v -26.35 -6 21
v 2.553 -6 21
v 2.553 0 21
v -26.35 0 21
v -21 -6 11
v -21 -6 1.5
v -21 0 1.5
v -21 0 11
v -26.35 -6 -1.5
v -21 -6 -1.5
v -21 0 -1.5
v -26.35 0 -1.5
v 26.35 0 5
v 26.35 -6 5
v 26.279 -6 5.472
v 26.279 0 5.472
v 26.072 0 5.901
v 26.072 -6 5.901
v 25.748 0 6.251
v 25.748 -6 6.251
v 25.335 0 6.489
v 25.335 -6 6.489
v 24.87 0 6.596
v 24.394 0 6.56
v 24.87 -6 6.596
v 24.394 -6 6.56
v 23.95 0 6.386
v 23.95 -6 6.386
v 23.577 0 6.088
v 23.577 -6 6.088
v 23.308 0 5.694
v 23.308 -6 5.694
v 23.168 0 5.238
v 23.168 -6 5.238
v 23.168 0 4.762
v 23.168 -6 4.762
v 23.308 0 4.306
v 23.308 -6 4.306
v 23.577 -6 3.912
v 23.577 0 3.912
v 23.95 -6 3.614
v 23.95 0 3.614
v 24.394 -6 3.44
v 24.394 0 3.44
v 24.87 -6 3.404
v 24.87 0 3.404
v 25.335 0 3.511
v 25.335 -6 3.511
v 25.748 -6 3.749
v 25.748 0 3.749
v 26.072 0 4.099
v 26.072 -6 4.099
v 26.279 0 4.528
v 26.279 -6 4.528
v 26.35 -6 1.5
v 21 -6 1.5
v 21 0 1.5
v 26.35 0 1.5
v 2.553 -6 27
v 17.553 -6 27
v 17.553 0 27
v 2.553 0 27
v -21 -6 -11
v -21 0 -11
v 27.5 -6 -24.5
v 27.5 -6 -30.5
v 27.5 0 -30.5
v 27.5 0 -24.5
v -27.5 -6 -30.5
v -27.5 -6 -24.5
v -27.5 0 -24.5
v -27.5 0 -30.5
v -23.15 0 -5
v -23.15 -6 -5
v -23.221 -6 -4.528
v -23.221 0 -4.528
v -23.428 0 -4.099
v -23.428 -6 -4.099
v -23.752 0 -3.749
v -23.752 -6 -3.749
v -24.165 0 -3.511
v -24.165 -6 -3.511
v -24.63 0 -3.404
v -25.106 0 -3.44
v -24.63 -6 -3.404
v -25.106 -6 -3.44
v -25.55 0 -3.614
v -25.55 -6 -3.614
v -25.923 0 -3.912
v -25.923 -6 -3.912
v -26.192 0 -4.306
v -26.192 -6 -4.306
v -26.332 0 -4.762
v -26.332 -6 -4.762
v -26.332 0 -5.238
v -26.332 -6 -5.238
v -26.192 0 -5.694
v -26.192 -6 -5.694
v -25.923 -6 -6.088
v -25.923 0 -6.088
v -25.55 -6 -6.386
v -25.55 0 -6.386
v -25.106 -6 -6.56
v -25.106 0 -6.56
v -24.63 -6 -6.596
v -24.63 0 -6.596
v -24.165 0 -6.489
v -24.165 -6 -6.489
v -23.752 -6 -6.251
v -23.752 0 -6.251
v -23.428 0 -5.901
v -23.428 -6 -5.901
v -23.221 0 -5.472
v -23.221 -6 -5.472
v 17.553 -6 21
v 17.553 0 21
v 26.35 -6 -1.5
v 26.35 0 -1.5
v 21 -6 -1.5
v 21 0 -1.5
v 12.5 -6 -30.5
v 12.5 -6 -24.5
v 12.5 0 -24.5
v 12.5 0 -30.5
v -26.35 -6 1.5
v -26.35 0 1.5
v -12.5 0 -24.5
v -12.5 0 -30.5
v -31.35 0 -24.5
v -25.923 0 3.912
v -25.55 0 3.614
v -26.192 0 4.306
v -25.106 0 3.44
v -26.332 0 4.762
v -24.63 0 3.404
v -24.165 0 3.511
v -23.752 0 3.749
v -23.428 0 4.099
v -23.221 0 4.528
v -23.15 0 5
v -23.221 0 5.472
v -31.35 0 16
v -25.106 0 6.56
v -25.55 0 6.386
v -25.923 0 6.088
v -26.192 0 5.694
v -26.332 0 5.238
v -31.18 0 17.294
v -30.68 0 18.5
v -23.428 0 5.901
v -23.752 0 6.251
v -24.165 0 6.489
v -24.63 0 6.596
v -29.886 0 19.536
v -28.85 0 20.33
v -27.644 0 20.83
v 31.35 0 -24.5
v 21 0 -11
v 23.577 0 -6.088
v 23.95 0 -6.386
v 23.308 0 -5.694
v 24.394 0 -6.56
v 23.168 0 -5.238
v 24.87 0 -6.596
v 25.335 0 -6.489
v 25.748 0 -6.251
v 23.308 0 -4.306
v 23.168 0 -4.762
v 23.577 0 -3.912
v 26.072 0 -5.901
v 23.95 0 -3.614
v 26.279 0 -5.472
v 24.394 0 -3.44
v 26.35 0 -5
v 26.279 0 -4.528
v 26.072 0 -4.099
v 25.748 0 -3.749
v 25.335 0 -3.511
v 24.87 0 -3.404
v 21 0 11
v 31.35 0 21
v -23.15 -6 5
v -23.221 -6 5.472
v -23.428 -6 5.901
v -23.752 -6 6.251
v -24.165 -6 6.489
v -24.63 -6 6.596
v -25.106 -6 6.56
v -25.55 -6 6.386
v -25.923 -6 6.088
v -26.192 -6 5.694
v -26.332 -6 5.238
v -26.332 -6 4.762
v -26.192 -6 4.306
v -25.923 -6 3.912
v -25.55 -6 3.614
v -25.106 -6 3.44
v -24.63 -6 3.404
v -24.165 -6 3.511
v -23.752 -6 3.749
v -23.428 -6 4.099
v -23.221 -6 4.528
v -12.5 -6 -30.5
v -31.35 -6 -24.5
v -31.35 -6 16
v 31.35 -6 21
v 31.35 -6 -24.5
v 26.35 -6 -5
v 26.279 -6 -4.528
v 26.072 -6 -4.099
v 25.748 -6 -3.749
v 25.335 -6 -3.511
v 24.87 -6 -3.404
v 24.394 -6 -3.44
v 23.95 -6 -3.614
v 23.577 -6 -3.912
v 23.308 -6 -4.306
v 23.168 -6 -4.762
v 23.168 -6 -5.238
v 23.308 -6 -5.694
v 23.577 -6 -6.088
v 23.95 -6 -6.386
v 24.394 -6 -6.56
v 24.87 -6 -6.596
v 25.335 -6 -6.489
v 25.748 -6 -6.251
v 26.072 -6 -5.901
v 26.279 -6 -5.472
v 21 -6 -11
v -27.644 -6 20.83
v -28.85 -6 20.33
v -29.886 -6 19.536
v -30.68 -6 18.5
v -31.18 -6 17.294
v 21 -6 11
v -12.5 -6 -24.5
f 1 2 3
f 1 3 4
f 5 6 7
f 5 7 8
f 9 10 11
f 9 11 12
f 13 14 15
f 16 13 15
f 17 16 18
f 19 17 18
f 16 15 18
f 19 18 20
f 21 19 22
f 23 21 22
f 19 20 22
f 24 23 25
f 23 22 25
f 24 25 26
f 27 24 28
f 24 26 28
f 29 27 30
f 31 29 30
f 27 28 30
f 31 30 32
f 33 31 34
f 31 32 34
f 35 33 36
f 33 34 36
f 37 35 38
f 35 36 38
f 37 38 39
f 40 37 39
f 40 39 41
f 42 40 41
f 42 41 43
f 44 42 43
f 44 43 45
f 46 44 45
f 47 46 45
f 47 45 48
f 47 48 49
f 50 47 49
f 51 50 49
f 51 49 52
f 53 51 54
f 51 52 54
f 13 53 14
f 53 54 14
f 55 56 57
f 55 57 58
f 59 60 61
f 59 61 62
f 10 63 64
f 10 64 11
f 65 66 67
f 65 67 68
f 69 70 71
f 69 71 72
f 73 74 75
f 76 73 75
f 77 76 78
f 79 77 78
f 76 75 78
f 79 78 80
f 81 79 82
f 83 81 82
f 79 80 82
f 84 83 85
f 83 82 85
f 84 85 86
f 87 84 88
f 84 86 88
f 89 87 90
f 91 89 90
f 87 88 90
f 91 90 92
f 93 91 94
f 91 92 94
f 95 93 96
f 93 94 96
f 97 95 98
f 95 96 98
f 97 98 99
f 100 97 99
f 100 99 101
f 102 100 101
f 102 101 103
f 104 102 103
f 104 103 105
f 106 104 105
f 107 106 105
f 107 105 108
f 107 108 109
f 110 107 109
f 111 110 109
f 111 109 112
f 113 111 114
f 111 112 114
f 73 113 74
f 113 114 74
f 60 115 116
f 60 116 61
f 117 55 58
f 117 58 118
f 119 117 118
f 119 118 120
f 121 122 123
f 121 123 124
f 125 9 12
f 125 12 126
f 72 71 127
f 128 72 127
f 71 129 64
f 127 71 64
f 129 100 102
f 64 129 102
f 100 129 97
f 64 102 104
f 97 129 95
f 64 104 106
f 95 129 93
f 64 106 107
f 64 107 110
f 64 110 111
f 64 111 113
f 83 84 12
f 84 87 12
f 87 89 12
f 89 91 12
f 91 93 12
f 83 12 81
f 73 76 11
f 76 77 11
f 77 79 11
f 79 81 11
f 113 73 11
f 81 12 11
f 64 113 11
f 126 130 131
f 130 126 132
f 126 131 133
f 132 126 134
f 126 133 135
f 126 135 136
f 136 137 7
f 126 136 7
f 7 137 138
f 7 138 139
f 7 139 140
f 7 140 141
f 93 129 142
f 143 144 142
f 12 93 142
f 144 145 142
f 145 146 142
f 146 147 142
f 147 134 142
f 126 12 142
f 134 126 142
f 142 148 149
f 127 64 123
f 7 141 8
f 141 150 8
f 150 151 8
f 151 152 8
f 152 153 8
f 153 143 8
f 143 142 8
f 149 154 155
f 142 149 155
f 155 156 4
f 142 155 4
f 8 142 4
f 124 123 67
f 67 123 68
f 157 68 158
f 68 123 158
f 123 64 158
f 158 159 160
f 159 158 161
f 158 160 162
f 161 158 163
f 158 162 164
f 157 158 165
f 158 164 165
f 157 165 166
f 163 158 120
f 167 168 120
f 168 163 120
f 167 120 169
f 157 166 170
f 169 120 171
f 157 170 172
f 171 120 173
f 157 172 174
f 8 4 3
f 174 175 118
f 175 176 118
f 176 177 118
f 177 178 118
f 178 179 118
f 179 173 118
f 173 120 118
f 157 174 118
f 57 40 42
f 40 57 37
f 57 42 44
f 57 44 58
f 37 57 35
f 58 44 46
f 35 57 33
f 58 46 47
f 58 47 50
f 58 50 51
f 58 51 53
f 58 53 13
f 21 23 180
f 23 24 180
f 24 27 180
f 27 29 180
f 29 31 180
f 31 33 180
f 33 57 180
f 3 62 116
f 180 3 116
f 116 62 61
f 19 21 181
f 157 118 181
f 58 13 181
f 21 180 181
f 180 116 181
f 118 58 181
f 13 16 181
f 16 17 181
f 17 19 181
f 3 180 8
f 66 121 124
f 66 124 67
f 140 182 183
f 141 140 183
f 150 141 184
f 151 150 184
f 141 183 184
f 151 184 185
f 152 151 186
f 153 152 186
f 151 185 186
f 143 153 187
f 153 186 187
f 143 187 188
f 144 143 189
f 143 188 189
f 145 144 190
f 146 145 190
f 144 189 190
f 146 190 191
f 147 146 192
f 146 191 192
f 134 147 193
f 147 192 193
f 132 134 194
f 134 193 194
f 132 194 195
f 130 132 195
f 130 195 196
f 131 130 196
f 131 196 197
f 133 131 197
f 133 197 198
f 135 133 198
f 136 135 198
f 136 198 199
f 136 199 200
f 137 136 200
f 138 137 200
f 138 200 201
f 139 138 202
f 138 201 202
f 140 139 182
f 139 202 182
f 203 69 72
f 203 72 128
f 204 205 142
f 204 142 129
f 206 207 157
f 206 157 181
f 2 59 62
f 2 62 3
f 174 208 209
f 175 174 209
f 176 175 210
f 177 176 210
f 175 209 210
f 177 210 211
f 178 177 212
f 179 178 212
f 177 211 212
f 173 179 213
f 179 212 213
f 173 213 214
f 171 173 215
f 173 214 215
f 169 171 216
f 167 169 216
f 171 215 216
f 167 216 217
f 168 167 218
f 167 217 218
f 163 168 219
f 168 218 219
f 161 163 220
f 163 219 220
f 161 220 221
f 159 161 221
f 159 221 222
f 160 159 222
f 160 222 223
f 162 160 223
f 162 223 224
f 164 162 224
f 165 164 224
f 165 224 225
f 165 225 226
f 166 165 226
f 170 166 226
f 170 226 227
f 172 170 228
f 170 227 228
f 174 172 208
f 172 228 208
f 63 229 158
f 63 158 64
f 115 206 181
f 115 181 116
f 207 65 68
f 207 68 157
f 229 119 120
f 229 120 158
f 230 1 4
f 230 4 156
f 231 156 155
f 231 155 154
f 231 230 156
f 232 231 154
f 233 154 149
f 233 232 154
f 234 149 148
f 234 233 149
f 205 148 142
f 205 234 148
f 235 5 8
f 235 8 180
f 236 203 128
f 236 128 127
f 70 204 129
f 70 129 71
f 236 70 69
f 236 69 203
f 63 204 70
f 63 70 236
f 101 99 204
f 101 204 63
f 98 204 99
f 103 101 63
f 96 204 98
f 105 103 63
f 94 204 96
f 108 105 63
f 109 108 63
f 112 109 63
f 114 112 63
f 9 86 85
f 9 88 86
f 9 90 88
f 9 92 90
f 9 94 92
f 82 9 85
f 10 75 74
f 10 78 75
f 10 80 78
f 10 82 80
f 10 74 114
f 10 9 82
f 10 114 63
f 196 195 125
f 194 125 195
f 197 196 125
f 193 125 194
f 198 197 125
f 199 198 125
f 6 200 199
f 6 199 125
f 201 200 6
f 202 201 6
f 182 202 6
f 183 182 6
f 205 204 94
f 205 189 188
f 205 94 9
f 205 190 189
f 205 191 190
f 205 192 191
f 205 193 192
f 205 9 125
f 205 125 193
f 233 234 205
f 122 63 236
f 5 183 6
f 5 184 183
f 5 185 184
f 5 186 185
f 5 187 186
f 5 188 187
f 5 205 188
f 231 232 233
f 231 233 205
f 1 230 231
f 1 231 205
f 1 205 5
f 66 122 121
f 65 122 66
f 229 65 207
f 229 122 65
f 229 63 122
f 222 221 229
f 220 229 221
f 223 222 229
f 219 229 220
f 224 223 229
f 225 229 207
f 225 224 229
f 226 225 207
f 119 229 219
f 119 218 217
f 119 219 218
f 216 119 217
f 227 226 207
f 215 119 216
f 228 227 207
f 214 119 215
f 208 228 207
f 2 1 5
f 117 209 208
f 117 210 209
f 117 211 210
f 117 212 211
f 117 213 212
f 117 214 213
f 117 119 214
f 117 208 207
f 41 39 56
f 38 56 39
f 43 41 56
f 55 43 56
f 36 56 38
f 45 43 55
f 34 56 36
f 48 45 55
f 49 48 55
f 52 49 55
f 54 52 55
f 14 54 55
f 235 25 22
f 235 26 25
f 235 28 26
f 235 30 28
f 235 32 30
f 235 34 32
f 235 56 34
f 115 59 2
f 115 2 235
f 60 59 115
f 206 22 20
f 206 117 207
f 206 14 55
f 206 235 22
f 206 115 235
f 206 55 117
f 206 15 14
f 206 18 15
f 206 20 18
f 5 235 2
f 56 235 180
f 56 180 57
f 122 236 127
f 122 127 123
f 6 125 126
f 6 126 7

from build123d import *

# Parameters (mm, degrees)
ESBO_O1_R                = 1.6
RESSALTO_EXTRUS_O1_DEPTH = 6


with BuildPart() as part:
    # Esboço1 → Ressalto-extrusão1 (new body)
    with BuildSketch(Plane.XZ.offset(6)):
        with BuildLine():
            Line((2.55259, 21), (-26.35, 21))
            ThreePointArc((-26.35, 21), (-29.885533906, 19.535533906), (-31.35, 16))
            Line((-31.35, 16), (-31.35, -24.5))
            Line((-31.35, -24.5), (-27.5, -24.5))
            Line((-27.5, -24.5), (-27.5, -30.5))
            Line((-27.5, -30.5), (-12.5, -30.5))
            Line((-12.5, -30.5), (-12.5, -24.5))
            Line((-12.5, -24.5), (12.5, -24.5))
            Line((12.5, -24.5), (12.5, -30.5))
            Line((12.5, -30.5), (27.5, -30.5))
            Line((27.5, -30.5), (27.5, -24.5))
            Line((27.5, -24.5), (31.35, -24.5))
            Line((31.35, -24.5), (31.35, 21))
            Line((31.35, 21), (17.55259, 21))
            Line((17.55259, 21), (17.55259, 27))
            Line((17.55259, 27), (2.55259, 27))
            Line((2.55259, 27), (2.55259, 21))
        make_face()
        with Locations((24.75, 5)):
            Circle(ESBO_O1_R, mode=Mode.SUBTRACT)
        with Locations((24.75, -5)):
            Circle(ESBO_O1_R, mode=Mode.SUBTRACT)
        with Locations((-24.75, 5)):
            Circle(ESBO_O1_R, mode=Mode.SUBTRACT)
        with Locations((-24.75, -5)):
            Circle(ESBO_O1_R, mode=Mode.SUBTRACT)
        Polygon((-26.35, 1.5), (-21, 1.5), (-21, 11), (21, 11), (21, 1.5), (26.35, 1.5), (26.35, -1.5), (21, -1.5), (21, -11), (-21, -11), (-21, -1.5), (-26.35, -1.5), align=None, mode=Mode.SUBTRACT)
    extrude(amount=-RESSALTO_EXTRUS_O1_DEPTH)


solid = part.part
